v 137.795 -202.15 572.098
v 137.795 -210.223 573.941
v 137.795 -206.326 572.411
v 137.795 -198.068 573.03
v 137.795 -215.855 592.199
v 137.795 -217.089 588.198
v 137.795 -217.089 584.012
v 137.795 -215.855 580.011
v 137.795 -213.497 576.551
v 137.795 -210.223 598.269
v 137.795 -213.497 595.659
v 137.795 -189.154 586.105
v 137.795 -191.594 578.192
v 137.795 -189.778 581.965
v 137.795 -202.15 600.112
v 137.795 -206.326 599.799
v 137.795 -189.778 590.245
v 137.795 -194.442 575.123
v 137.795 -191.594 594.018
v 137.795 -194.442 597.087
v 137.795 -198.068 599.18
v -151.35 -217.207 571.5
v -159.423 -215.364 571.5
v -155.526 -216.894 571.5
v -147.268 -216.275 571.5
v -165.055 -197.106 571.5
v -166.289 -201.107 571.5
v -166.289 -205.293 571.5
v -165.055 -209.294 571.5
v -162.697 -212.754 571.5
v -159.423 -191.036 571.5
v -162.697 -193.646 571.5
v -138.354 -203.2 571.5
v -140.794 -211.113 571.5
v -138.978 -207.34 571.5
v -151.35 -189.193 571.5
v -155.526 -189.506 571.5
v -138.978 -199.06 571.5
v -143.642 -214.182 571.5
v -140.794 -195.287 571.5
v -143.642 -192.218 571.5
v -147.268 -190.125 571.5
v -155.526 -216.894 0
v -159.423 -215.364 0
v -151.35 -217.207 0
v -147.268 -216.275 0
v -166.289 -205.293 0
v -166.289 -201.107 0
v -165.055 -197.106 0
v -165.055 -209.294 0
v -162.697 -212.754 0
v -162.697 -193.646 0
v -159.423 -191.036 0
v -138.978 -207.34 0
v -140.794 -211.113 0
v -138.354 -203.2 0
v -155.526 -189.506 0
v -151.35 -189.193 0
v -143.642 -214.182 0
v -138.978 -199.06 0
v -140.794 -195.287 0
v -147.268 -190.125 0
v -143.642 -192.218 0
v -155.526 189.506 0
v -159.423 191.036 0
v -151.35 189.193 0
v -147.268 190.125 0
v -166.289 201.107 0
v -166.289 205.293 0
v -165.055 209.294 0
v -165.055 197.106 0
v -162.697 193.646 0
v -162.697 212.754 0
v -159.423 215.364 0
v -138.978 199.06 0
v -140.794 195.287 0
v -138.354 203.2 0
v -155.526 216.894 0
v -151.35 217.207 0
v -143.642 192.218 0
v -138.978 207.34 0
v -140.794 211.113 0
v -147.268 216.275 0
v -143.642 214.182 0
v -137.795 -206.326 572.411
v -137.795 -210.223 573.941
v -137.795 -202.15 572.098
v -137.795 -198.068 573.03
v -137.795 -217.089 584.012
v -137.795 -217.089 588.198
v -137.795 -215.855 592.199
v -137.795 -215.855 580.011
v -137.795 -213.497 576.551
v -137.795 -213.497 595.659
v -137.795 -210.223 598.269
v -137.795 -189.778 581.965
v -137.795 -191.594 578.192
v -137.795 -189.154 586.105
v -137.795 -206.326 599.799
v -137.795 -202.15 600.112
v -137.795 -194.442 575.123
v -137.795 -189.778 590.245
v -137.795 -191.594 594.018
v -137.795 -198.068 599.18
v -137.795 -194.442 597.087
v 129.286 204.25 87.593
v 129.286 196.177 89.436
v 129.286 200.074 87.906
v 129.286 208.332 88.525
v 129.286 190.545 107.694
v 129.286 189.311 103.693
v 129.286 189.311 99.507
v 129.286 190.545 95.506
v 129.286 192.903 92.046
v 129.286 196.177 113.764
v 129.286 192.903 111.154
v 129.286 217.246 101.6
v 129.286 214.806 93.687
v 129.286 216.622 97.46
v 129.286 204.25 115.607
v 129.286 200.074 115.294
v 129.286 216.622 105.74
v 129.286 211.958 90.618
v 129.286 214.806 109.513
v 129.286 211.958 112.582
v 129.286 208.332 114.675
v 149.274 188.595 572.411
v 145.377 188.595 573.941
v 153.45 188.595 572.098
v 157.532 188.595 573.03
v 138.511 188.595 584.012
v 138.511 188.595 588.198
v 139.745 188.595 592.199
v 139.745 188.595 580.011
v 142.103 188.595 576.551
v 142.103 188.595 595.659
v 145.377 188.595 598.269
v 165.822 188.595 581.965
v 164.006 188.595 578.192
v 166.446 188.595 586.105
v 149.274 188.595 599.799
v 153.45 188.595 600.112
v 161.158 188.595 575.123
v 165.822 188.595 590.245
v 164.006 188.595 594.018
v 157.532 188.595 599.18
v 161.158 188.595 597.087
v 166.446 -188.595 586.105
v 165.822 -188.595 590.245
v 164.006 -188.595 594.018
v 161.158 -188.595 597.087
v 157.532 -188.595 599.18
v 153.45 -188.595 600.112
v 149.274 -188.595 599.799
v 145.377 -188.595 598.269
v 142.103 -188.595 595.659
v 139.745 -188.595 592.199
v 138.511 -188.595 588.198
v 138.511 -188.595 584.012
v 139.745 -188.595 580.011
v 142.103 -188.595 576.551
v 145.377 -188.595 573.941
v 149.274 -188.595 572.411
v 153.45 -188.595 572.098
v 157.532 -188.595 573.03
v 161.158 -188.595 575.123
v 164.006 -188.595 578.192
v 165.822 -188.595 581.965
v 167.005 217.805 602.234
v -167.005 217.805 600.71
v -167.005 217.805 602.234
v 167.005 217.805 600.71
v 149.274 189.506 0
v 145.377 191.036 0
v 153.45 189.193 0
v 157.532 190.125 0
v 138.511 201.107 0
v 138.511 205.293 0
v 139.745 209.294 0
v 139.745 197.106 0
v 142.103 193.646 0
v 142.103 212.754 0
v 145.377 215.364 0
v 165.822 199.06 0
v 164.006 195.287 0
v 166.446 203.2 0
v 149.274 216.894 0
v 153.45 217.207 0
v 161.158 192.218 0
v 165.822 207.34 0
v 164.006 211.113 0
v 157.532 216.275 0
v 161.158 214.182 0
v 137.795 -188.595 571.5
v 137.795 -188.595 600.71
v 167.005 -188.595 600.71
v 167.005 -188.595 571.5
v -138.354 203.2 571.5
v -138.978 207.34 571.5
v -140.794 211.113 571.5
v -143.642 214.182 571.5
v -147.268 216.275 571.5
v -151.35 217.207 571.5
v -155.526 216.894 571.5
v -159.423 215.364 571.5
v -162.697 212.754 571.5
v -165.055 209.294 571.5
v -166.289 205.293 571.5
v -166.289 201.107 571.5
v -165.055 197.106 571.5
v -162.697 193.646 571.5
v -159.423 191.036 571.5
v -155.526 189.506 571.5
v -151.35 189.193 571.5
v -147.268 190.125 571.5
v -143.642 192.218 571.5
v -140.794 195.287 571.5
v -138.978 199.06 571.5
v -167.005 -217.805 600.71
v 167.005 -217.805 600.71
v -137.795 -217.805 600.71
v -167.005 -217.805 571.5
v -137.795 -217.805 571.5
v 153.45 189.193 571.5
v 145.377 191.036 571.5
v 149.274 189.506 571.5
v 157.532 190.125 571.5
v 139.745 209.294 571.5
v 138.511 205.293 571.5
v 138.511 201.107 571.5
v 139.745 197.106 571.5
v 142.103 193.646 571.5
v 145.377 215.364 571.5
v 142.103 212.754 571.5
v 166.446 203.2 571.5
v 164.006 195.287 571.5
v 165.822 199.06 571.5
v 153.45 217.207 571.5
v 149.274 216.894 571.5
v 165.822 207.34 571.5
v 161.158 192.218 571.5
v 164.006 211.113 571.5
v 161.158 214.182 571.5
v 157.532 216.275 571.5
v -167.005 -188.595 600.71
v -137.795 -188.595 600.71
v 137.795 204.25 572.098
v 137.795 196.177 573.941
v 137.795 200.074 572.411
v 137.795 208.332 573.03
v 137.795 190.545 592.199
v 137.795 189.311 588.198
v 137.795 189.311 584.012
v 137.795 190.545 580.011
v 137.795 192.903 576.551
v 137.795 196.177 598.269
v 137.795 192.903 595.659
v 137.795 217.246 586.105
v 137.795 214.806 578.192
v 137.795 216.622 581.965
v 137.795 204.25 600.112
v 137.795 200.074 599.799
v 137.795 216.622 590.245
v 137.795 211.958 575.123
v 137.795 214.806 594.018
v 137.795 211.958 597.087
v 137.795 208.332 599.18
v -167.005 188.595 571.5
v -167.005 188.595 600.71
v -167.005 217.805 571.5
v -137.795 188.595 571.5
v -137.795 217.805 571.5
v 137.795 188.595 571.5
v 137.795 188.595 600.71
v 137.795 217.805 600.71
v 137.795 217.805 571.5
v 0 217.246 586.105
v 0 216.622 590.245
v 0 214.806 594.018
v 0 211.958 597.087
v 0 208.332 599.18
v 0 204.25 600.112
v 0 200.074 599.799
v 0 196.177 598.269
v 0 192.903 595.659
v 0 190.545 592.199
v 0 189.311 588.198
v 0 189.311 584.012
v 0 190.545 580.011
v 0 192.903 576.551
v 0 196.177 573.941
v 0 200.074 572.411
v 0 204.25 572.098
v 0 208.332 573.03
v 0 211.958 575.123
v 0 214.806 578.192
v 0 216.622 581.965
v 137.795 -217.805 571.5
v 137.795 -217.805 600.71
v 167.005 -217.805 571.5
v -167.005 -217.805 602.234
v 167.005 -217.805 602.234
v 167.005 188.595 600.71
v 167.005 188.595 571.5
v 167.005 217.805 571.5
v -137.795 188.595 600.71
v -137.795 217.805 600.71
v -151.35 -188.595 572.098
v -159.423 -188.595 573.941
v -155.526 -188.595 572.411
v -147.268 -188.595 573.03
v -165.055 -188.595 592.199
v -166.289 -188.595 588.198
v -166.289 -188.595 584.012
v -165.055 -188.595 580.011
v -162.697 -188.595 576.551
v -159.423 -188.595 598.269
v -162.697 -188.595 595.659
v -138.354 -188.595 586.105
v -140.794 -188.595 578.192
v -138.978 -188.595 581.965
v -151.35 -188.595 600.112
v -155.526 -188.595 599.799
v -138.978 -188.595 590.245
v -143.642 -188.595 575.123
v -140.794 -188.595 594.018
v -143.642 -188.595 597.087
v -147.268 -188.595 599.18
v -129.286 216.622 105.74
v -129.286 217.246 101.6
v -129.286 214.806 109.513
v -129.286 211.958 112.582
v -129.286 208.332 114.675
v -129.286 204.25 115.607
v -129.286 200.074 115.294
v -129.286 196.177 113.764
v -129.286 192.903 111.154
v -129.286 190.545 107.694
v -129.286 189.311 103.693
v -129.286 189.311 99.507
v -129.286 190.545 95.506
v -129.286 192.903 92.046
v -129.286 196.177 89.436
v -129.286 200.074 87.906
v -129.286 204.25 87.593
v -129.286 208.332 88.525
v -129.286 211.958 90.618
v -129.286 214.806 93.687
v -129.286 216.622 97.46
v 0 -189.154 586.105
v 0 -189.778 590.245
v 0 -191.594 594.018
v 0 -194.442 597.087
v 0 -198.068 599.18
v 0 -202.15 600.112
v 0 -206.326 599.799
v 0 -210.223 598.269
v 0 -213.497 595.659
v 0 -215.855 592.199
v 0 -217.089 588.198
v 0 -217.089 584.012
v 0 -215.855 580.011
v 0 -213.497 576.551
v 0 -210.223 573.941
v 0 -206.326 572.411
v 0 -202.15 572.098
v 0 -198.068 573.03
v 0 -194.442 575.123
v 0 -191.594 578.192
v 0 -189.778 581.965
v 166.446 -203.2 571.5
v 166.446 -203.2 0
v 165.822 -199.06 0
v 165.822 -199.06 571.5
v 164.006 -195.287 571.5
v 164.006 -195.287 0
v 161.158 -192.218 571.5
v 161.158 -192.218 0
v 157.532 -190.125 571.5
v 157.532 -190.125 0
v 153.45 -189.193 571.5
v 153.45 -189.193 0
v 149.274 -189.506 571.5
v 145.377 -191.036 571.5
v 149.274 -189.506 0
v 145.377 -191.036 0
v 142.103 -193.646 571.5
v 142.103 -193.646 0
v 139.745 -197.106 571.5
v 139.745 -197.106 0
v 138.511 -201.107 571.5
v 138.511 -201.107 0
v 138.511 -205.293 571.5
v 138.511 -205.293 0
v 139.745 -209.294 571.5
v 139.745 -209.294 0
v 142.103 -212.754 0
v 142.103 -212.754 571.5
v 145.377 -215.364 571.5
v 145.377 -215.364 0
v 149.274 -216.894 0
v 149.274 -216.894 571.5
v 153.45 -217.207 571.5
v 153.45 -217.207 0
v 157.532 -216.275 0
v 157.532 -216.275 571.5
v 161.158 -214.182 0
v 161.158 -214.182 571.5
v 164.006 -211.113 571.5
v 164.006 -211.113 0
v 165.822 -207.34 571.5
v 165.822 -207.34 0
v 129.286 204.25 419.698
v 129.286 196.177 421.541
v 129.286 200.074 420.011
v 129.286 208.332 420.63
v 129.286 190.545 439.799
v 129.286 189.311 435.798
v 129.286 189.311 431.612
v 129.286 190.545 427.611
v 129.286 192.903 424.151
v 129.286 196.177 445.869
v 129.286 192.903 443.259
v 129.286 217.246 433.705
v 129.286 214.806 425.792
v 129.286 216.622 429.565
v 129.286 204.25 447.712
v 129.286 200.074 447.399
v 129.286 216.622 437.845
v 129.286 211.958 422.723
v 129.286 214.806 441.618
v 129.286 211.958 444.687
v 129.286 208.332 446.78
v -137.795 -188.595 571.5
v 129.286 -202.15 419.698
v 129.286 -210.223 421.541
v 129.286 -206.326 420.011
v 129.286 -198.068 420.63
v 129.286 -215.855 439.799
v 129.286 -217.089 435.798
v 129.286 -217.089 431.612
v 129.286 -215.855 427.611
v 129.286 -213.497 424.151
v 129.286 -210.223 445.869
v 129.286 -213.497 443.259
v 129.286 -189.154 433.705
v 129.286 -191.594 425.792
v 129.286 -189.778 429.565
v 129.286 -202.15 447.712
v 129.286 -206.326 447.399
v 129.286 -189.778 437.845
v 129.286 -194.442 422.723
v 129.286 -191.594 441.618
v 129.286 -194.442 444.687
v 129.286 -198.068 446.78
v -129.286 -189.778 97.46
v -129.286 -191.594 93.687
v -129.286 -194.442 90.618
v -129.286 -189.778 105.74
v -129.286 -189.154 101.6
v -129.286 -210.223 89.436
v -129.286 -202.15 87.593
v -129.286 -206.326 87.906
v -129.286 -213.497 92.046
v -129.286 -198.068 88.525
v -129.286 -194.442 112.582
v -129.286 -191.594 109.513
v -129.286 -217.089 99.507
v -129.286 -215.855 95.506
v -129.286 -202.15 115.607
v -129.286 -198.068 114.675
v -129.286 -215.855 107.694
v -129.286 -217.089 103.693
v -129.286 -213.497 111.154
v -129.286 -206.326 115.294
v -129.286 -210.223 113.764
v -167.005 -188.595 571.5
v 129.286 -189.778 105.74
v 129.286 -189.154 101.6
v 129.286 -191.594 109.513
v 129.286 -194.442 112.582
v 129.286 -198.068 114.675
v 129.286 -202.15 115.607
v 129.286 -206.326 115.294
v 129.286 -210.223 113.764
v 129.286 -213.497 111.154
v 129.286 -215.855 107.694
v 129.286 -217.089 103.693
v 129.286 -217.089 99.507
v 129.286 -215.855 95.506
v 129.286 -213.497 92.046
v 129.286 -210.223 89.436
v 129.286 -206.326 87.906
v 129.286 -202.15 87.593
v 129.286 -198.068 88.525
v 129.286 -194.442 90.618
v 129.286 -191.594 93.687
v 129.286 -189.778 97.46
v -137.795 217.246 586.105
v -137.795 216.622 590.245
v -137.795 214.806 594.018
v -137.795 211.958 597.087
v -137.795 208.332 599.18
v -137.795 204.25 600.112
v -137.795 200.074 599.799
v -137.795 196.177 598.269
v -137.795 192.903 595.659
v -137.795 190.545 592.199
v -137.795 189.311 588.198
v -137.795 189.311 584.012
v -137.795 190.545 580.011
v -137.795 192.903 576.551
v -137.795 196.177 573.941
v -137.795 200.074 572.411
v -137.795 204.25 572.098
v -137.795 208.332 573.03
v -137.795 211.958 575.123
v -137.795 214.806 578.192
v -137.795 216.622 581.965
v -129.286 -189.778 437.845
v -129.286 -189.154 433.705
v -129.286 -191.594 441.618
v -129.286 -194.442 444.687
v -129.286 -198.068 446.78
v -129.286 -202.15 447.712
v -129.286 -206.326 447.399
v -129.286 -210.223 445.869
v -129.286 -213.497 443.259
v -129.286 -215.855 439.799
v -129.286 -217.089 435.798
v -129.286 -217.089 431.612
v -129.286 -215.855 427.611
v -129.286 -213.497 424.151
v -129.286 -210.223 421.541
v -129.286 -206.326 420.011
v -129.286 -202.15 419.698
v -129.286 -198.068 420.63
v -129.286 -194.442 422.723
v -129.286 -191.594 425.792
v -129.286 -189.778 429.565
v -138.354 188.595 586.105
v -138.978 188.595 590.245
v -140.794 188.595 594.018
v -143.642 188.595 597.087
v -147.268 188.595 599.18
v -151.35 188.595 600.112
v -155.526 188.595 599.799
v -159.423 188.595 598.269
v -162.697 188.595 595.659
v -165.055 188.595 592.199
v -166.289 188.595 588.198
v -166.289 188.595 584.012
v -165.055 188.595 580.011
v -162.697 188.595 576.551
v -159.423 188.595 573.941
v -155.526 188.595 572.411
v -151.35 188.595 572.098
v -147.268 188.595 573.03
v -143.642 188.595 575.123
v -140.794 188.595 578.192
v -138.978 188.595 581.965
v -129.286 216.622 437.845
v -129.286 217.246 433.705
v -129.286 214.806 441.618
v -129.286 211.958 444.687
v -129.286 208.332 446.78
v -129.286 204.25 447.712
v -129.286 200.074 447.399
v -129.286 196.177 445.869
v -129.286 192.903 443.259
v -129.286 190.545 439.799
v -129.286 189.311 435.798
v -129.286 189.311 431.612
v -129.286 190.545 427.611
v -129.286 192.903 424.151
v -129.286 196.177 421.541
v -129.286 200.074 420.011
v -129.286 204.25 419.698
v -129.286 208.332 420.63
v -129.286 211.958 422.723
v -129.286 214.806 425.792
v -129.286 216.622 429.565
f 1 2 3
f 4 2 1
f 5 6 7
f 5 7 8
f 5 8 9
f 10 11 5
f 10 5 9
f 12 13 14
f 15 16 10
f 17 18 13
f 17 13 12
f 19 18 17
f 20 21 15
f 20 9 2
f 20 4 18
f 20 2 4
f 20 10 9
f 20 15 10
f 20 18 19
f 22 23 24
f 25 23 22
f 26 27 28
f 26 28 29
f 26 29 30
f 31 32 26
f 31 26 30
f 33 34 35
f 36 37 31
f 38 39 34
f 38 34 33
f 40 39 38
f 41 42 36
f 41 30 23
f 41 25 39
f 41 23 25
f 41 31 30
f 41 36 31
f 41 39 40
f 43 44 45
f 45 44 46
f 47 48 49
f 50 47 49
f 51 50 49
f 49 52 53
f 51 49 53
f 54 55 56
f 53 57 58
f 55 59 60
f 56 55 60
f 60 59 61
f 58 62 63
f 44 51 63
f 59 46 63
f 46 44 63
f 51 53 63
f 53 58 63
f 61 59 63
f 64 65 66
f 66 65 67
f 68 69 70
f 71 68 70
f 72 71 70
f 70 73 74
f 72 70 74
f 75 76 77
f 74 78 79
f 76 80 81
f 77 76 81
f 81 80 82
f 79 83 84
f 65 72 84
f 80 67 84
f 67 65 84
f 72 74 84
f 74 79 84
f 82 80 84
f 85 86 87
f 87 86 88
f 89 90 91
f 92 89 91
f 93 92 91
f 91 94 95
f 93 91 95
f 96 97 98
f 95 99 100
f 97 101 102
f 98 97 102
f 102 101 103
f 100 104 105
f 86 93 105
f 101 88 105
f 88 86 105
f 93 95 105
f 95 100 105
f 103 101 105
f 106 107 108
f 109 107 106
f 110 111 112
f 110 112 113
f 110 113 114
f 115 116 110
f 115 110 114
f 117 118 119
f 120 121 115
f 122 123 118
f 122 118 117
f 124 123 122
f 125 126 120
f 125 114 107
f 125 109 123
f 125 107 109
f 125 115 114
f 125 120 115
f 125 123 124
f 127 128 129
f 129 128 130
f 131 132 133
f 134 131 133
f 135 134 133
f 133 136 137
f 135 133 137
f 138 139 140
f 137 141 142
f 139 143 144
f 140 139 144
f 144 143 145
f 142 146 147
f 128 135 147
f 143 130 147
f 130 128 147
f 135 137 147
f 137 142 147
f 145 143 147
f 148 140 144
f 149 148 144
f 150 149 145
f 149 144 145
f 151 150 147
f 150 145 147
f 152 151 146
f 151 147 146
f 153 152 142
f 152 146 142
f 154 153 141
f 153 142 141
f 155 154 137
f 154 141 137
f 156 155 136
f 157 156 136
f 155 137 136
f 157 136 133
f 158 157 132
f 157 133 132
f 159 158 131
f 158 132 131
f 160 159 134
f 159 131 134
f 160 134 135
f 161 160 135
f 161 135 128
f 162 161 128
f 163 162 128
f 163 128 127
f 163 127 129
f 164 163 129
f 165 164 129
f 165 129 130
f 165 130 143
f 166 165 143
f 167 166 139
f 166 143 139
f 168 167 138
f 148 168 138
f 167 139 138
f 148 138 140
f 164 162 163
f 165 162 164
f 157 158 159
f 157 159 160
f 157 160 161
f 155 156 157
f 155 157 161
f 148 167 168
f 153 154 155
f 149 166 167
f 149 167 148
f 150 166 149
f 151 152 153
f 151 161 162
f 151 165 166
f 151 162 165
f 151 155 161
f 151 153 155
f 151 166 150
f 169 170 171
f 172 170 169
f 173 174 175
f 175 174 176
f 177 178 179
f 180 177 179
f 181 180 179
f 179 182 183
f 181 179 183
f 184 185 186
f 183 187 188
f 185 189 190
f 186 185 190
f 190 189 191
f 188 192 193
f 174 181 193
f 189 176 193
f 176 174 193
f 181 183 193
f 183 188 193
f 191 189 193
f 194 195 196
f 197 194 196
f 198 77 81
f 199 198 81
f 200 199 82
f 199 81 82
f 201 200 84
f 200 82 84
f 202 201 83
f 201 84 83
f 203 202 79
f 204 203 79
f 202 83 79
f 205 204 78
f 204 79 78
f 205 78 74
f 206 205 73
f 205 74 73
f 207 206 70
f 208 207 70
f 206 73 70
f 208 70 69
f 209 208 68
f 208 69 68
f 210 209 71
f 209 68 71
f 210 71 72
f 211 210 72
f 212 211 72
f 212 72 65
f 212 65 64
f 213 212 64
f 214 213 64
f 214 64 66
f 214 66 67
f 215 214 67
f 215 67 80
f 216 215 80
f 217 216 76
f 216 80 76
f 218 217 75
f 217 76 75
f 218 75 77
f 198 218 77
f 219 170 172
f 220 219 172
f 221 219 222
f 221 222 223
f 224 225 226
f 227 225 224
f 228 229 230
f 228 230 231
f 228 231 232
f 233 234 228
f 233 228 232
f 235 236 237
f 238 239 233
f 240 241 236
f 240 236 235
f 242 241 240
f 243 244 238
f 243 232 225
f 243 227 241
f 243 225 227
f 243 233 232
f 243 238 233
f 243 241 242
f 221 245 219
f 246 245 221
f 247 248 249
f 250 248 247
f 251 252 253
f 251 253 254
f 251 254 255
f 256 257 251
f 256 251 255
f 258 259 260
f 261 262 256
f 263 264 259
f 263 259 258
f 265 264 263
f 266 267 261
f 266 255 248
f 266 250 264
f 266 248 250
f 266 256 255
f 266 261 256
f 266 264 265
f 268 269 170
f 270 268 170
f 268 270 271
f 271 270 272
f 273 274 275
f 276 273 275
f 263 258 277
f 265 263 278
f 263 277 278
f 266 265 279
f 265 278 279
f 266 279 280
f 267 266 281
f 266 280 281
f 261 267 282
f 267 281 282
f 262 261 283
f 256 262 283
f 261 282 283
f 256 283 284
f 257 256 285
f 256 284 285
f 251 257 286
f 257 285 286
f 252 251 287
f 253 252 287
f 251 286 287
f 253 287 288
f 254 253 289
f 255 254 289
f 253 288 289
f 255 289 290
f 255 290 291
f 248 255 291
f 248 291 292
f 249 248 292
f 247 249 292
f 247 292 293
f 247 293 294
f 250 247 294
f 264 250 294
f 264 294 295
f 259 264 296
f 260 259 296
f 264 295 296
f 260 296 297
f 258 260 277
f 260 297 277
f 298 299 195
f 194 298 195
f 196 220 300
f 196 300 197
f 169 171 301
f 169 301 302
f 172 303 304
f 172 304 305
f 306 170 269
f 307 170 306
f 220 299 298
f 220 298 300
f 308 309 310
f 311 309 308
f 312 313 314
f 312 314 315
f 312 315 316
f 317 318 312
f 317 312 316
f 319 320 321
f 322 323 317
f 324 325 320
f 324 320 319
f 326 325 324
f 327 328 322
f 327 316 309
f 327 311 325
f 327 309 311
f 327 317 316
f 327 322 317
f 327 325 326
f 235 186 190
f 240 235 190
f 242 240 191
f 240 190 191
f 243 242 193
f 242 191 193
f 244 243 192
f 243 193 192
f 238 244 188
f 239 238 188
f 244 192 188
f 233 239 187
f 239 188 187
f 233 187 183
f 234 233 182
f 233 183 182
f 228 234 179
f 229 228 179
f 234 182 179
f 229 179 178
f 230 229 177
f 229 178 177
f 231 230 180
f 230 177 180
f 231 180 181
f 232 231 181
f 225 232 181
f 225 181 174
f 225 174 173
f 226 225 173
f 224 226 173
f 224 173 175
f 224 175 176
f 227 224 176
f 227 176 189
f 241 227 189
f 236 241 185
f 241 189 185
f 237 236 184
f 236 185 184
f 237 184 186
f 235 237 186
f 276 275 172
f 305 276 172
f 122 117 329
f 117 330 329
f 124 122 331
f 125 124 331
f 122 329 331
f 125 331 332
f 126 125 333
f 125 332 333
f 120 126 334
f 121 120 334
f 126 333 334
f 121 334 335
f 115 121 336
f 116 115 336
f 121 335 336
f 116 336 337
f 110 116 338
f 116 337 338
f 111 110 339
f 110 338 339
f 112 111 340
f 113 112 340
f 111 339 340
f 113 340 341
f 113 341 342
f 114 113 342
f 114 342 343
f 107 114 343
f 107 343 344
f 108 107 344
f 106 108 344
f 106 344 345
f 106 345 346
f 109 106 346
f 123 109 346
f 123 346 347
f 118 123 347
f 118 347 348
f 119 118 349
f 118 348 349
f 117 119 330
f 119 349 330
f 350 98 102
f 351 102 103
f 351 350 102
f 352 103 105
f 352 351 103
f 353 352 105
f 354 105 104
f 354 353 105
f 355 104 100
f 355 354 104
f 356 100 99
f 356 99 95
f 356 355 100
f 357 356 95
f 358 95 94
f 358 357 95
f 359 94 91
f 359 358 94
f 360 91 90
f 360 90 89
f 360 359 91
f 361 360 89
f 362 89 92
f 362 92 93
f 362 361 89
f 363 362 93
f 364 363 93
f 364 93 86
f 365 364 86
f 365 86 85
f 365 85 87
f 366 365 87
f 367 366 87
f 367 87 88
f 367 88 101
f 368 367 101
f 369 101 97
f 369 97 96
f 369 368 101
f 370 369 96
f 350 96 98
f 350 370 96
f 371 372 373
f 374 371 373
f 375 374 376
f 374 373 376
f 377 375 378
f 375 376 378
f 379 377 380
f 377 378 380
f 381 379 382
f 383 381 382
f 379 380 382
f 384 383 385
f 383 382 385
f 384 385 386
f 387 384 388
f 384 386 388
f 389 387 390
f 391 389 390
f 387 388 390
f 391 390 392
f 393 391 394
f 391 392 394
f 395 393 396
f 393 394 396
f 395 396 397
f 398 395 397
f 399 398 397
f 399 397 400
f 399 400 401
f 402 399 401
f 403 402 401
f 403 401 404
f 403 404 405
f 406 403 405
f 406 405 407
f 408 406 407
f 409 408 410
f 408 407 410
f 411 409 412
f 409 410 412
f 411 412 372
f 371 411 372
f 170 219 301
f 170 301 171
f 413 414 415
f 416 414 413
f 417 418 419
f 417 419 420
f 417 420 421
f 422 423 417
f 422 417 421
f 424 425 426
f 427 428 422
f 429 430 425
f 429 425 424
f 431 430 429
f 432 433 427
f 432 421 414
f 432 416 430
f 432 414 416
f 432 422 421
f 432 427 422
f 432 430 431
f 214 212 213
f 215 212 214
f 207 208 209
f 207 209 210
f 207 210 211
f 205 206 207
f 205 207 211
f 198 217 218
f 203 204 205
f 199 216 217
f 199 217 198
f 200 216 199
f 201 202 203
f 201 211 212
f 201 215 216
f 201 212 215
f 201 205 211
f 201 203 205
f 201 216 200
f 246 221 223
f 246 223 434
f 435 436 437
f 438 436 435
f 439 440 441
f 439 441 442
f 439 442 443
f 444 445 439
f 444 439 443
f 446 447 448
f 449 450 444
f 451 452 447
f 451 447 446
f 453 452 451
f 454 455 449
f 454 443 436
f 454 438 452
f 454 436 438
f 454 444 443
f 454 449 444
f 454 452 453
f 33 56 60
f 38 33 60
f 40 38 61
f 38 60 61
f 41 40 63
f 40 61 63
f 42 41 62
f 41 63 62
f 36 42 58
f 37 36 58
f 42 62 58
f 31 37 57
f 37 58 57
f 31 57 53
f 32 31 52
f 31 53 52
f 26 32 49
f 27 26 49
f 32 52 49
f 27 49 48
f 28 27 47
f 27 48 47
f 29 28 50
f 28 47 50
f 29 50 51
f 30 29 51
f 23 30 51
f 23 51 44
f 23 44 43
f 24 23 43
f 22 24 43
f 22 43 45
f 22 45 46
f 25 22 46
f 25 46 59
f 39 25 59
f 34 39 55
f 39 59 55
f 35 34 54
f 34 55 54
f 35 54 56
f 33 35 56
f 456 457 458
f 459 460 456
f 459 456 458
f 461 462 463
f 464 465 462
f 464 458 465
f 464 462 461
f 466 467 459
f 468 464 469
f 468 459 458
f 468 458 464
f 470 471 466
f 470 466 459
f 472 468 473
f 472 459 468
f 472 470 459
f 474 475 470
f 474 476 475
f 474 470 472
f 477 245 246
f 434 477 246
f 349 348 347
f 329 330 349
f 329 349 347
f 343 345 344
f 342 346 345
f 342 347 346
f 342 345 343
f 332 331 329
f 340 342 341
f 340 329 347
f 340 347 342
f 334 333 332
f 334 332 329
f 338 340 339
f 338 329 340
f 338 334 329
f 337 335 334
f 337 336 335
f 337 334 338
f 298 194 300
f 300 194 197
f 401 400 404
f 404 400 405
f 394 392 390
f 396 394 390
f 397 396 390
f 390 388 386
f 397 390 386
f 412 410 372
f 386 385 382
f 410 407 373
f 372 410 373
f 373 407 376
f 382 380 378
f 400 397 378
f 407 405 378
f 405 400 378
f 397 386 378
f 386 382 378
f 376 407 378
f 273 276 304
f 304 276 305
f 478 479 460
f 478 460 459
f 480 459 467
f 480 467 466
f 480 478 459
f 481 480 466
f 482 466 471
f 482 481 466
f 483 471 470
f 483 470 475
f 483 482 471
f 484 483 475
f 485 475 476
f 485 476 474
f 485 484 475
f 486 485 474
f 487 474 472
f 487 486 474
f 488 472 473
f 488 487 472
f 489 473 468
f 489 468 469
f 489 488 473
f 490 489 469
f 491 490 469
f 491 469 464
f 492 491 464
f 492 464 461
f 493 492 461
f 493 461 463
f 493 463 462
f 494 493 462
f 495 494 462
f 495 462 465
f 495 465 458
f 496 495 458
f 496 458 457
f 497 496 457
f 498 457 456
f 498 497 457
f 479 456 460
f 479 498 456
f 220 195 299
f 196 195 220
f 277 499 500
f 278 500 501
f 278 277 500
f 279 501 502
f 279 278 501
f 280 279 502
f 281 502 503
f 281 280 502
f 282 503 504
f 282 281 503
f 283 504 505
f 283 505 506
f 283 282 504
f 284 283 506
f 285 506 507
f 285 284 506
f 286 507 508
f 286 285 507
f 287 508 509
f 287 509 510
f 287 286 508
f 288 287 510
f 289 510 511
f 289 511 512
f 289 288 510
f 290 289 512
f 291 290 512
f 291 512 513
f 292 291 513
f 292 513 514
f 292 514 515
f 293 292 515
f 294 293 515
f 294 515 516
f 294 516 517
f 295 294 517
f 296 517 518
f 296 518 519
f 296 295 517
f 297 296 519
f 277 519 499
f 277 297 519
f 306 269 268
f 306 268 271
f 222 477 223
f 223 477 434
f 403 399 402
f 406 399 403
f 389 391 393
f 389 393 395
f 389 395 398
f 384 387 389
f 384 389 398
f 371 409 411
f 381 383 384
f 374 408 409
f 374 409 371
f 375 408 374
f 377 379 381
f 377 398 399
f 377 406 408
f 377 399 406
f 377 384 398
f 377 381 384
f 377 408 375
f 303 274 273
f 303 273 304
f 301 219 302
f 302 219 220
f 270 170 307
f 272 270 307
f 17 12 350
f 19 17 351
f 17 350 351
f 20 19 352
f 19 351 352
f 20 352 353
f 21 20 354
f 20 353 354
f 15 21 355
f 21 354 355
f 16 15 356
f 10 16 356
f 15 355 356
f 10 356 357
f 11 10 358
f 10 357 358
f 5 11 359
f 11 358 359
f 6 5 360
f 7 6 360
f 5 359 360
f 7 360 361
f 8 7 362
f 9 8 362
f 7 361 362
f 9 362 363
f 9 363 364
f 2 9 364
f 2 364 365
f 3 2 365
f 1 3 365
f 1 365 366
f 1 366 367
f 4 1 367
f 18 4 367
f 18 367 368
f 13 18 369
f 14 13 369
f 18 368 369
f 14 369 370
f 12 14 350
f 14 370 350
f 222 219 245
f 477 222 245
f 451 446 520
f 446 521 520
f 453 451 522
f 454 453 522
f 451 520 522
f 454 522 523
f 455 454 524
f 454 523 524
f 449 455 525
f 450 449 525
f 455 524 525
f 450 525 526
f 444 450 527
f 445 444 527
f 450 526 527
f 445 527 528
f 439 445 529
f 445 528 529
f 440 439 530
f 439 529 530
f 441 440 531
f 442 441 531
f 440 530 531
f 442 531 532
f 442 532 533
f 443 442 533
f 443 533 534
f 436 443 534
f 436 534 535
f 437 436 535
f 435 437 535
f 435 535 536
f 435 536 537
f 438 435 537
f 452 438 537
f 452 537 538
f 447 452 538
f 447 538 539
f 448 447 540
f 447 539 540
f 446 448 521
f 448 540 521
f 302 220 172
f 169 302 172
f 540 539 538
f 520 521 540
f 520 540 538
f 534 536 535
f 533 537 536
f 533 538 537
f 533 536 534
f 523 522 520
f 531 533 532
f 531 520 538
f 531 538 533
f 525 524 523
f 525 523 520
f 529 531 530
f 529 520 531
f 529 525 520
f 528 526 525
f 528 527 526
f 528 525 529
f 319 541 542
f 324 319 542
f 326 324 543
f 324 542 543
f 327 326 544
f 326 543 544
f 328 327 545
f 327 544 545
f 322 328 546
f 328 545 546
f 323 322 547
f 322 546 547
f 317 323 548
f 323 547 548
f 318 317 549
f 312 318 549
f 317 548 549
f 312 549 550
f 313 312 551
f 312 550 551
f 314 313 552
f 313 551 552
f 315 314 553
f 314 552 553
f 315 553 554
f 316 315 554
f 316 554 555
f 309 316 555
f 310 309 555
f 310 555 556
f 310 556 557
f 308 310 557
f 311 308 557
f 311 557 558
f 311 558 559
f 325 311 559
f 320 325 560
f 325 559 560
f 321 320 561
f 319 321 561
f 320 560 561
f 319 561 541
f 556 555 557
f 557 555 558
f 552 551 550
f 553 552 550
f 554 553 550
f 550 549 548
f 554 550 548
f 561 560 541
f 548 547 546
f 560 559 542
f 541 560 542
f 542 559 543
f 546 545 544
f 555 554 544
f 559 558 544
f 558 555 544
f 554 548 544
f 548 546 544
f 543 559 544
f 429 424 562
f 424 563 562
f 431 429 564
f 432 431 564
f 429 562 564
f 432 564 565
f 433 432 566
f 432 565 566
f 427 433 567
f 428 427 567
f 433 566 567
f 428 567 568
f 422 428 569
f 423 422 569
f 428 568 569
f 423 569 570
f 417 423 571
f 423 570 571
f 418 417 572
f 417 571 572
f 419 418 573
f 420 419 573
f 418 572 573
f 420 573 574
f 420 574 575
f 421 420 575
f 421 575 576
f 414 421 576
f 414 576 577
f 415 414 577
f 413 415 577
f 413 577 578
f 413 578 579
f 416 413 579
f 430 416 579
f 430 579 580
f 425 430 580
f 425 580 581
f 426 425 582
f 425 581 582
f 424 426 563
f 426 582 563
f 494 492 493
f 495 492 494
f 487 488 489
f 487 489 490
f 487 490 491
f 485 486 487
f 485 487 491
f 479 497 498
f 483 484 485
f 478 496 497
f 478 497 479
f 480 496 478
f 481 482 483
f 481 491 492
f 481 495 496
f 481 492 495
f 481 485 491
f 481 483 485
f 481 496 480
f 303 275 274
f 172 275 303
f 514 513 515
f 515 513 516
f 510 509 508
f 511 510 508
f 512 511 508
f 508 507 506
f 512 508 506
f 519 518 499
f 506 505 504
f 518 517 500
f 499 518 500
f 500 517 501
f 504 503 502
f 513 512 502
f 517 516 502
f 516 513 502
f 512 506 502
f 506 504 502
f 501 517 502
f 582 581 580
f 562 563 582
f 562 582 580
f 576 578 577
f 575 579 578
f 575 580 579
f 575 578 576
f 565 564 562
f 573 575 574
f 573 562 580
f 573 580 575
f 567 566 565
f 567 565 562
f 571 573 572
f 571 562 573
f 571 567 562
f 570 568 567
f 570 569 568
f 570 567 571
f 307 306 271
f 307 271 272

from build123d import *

# Parameters (mm, degrees)
F0_R      = 14.0462
F1_DEPTH  = 571.5
F2_R      = 14.0462
F3_DEPTH  = 137.795
F4_W      = 29.21
F4_H      = 29.21
F5_DEPTH  = 29.21
F6_R      = 14.0462
F7_DEPTH  = 8.509
F8_R      = 14.0462
F9_DEPTH  = 8.509
F10_R     = 14.0462
F11_DEPTH = 377.19
F12_W     = 334.01
F12_H     = 435.61
F13_DEPTH = 1.524


with BuildPart() as f1:
    # F0 (on Top) → F1 (new body)
    with BuildSketch(Plane.XY):
        with Locations((-152.4, 203.2)):
            Circle(F0_R)
        with Locations((152.4, 203.2)):
            Circle(F0_R)
        with Locations((-152.4, -203.2)):
            Circle(F0_R)
        with Locations((152.4, -203.2)):
            Circle(F0_R)
    extrude(amount=F1_DEPTH)


with BuildPart() as f3:
    # F2 (on Right) → F3 (new body, symmetric)
    with BuildSketch(Plane.YZ):
        with Locations((203.2, 101.6)):
            Circle(F2_R)
        with Locations((203.2, 433.705)):
            Circle(F2_R)
        with Locations((203.2, 586.105)):
            Circle(F2_R)
        with Locations((-203.2, 586.105)):
            Circle(F2_R)
        with Locations((-203.2, 433.705)):
            Circle(F2_R)
        with Locations((-203.2, 101.6)):
            Circle(F2_R)
    extrude(amount=F3_DEPTH, both=True)

    # F6 (on face) → F7 (cut)
    with BuildSketch(Plane(origin=(-137.795, 0, 0), x_dir=(0, -1, 0), z_dir=(-1, 0, 0))):
        with Locations((-203.2, 433.705)):
            Circle(F6_R)
        with Locations((203.2, 433.705)):
            Circle(F6_R)
        with Locations((-203.2, 101.6)):
            Circle(F6_R)
        with Locations((203.2, 101.6)):
            Circle(F6_R)
    extrude(amount=-F7_DEPTH, mode=Mode.SUBTRACT)

    # F8 (on face) → F9 (cut)
    with BuildSketch(Plane.YZ.offset(137.795)):
        with Locations((203.2, 101.6)):
            Circle(F8_R)
        with Locations((203.2, 433.705)):
            Circle(F8_R)
        with Locations((-203.2, 433.705)):
            Circle(F8_R)
        with Locations((-203.2, 101.6)):
            Circle(F8_R)
    extrude(amount=-F9_DEPTH, mode=Mode.SUBTRACT)


with BuildPart() as f5:
    # F4 (on face) → F5 (new body)
    with BuildSketch(Plane.XY.offset(571.5)):
        with Locations((152.4, -203.2)):
            Rectangle(F4_W, F4_H)
        with Locations((152.4, 203.2)):
            Rectangle(F4_W, F4_H)
        with Locations((-152.4, 203.2)):
            Rectangle(F4_W, F4_H)
        with Locations((-152.4, -203.2)):
            Rectangle(F4_W, F4_H)
    extrude(amount=F5_DEPTH)


with BuildPart() as f11:
    # F10 (on face) → F11 (new body, through all)
    with BuildSketch(Plane.XZ.offset(-188.595)):
        with Locations((152.4, 586.105)):
            Circle(F10_R)
        with Locations((-152.4, 586.105)):
            Circle(F10_R)
    extrude(amount=F11_DEPTH)


with BuildPart() as f13:
    # F12 (on face) → F13 (new body)
    with BuildSketch(Plane.XY.offset(600.71)):
        Rectangle(F12_W, F12_H)
    extrude(amount=F13_DEPTH)


solid = Compound([f1.part, f3.part, f5.part, f11.part, f13.part])
